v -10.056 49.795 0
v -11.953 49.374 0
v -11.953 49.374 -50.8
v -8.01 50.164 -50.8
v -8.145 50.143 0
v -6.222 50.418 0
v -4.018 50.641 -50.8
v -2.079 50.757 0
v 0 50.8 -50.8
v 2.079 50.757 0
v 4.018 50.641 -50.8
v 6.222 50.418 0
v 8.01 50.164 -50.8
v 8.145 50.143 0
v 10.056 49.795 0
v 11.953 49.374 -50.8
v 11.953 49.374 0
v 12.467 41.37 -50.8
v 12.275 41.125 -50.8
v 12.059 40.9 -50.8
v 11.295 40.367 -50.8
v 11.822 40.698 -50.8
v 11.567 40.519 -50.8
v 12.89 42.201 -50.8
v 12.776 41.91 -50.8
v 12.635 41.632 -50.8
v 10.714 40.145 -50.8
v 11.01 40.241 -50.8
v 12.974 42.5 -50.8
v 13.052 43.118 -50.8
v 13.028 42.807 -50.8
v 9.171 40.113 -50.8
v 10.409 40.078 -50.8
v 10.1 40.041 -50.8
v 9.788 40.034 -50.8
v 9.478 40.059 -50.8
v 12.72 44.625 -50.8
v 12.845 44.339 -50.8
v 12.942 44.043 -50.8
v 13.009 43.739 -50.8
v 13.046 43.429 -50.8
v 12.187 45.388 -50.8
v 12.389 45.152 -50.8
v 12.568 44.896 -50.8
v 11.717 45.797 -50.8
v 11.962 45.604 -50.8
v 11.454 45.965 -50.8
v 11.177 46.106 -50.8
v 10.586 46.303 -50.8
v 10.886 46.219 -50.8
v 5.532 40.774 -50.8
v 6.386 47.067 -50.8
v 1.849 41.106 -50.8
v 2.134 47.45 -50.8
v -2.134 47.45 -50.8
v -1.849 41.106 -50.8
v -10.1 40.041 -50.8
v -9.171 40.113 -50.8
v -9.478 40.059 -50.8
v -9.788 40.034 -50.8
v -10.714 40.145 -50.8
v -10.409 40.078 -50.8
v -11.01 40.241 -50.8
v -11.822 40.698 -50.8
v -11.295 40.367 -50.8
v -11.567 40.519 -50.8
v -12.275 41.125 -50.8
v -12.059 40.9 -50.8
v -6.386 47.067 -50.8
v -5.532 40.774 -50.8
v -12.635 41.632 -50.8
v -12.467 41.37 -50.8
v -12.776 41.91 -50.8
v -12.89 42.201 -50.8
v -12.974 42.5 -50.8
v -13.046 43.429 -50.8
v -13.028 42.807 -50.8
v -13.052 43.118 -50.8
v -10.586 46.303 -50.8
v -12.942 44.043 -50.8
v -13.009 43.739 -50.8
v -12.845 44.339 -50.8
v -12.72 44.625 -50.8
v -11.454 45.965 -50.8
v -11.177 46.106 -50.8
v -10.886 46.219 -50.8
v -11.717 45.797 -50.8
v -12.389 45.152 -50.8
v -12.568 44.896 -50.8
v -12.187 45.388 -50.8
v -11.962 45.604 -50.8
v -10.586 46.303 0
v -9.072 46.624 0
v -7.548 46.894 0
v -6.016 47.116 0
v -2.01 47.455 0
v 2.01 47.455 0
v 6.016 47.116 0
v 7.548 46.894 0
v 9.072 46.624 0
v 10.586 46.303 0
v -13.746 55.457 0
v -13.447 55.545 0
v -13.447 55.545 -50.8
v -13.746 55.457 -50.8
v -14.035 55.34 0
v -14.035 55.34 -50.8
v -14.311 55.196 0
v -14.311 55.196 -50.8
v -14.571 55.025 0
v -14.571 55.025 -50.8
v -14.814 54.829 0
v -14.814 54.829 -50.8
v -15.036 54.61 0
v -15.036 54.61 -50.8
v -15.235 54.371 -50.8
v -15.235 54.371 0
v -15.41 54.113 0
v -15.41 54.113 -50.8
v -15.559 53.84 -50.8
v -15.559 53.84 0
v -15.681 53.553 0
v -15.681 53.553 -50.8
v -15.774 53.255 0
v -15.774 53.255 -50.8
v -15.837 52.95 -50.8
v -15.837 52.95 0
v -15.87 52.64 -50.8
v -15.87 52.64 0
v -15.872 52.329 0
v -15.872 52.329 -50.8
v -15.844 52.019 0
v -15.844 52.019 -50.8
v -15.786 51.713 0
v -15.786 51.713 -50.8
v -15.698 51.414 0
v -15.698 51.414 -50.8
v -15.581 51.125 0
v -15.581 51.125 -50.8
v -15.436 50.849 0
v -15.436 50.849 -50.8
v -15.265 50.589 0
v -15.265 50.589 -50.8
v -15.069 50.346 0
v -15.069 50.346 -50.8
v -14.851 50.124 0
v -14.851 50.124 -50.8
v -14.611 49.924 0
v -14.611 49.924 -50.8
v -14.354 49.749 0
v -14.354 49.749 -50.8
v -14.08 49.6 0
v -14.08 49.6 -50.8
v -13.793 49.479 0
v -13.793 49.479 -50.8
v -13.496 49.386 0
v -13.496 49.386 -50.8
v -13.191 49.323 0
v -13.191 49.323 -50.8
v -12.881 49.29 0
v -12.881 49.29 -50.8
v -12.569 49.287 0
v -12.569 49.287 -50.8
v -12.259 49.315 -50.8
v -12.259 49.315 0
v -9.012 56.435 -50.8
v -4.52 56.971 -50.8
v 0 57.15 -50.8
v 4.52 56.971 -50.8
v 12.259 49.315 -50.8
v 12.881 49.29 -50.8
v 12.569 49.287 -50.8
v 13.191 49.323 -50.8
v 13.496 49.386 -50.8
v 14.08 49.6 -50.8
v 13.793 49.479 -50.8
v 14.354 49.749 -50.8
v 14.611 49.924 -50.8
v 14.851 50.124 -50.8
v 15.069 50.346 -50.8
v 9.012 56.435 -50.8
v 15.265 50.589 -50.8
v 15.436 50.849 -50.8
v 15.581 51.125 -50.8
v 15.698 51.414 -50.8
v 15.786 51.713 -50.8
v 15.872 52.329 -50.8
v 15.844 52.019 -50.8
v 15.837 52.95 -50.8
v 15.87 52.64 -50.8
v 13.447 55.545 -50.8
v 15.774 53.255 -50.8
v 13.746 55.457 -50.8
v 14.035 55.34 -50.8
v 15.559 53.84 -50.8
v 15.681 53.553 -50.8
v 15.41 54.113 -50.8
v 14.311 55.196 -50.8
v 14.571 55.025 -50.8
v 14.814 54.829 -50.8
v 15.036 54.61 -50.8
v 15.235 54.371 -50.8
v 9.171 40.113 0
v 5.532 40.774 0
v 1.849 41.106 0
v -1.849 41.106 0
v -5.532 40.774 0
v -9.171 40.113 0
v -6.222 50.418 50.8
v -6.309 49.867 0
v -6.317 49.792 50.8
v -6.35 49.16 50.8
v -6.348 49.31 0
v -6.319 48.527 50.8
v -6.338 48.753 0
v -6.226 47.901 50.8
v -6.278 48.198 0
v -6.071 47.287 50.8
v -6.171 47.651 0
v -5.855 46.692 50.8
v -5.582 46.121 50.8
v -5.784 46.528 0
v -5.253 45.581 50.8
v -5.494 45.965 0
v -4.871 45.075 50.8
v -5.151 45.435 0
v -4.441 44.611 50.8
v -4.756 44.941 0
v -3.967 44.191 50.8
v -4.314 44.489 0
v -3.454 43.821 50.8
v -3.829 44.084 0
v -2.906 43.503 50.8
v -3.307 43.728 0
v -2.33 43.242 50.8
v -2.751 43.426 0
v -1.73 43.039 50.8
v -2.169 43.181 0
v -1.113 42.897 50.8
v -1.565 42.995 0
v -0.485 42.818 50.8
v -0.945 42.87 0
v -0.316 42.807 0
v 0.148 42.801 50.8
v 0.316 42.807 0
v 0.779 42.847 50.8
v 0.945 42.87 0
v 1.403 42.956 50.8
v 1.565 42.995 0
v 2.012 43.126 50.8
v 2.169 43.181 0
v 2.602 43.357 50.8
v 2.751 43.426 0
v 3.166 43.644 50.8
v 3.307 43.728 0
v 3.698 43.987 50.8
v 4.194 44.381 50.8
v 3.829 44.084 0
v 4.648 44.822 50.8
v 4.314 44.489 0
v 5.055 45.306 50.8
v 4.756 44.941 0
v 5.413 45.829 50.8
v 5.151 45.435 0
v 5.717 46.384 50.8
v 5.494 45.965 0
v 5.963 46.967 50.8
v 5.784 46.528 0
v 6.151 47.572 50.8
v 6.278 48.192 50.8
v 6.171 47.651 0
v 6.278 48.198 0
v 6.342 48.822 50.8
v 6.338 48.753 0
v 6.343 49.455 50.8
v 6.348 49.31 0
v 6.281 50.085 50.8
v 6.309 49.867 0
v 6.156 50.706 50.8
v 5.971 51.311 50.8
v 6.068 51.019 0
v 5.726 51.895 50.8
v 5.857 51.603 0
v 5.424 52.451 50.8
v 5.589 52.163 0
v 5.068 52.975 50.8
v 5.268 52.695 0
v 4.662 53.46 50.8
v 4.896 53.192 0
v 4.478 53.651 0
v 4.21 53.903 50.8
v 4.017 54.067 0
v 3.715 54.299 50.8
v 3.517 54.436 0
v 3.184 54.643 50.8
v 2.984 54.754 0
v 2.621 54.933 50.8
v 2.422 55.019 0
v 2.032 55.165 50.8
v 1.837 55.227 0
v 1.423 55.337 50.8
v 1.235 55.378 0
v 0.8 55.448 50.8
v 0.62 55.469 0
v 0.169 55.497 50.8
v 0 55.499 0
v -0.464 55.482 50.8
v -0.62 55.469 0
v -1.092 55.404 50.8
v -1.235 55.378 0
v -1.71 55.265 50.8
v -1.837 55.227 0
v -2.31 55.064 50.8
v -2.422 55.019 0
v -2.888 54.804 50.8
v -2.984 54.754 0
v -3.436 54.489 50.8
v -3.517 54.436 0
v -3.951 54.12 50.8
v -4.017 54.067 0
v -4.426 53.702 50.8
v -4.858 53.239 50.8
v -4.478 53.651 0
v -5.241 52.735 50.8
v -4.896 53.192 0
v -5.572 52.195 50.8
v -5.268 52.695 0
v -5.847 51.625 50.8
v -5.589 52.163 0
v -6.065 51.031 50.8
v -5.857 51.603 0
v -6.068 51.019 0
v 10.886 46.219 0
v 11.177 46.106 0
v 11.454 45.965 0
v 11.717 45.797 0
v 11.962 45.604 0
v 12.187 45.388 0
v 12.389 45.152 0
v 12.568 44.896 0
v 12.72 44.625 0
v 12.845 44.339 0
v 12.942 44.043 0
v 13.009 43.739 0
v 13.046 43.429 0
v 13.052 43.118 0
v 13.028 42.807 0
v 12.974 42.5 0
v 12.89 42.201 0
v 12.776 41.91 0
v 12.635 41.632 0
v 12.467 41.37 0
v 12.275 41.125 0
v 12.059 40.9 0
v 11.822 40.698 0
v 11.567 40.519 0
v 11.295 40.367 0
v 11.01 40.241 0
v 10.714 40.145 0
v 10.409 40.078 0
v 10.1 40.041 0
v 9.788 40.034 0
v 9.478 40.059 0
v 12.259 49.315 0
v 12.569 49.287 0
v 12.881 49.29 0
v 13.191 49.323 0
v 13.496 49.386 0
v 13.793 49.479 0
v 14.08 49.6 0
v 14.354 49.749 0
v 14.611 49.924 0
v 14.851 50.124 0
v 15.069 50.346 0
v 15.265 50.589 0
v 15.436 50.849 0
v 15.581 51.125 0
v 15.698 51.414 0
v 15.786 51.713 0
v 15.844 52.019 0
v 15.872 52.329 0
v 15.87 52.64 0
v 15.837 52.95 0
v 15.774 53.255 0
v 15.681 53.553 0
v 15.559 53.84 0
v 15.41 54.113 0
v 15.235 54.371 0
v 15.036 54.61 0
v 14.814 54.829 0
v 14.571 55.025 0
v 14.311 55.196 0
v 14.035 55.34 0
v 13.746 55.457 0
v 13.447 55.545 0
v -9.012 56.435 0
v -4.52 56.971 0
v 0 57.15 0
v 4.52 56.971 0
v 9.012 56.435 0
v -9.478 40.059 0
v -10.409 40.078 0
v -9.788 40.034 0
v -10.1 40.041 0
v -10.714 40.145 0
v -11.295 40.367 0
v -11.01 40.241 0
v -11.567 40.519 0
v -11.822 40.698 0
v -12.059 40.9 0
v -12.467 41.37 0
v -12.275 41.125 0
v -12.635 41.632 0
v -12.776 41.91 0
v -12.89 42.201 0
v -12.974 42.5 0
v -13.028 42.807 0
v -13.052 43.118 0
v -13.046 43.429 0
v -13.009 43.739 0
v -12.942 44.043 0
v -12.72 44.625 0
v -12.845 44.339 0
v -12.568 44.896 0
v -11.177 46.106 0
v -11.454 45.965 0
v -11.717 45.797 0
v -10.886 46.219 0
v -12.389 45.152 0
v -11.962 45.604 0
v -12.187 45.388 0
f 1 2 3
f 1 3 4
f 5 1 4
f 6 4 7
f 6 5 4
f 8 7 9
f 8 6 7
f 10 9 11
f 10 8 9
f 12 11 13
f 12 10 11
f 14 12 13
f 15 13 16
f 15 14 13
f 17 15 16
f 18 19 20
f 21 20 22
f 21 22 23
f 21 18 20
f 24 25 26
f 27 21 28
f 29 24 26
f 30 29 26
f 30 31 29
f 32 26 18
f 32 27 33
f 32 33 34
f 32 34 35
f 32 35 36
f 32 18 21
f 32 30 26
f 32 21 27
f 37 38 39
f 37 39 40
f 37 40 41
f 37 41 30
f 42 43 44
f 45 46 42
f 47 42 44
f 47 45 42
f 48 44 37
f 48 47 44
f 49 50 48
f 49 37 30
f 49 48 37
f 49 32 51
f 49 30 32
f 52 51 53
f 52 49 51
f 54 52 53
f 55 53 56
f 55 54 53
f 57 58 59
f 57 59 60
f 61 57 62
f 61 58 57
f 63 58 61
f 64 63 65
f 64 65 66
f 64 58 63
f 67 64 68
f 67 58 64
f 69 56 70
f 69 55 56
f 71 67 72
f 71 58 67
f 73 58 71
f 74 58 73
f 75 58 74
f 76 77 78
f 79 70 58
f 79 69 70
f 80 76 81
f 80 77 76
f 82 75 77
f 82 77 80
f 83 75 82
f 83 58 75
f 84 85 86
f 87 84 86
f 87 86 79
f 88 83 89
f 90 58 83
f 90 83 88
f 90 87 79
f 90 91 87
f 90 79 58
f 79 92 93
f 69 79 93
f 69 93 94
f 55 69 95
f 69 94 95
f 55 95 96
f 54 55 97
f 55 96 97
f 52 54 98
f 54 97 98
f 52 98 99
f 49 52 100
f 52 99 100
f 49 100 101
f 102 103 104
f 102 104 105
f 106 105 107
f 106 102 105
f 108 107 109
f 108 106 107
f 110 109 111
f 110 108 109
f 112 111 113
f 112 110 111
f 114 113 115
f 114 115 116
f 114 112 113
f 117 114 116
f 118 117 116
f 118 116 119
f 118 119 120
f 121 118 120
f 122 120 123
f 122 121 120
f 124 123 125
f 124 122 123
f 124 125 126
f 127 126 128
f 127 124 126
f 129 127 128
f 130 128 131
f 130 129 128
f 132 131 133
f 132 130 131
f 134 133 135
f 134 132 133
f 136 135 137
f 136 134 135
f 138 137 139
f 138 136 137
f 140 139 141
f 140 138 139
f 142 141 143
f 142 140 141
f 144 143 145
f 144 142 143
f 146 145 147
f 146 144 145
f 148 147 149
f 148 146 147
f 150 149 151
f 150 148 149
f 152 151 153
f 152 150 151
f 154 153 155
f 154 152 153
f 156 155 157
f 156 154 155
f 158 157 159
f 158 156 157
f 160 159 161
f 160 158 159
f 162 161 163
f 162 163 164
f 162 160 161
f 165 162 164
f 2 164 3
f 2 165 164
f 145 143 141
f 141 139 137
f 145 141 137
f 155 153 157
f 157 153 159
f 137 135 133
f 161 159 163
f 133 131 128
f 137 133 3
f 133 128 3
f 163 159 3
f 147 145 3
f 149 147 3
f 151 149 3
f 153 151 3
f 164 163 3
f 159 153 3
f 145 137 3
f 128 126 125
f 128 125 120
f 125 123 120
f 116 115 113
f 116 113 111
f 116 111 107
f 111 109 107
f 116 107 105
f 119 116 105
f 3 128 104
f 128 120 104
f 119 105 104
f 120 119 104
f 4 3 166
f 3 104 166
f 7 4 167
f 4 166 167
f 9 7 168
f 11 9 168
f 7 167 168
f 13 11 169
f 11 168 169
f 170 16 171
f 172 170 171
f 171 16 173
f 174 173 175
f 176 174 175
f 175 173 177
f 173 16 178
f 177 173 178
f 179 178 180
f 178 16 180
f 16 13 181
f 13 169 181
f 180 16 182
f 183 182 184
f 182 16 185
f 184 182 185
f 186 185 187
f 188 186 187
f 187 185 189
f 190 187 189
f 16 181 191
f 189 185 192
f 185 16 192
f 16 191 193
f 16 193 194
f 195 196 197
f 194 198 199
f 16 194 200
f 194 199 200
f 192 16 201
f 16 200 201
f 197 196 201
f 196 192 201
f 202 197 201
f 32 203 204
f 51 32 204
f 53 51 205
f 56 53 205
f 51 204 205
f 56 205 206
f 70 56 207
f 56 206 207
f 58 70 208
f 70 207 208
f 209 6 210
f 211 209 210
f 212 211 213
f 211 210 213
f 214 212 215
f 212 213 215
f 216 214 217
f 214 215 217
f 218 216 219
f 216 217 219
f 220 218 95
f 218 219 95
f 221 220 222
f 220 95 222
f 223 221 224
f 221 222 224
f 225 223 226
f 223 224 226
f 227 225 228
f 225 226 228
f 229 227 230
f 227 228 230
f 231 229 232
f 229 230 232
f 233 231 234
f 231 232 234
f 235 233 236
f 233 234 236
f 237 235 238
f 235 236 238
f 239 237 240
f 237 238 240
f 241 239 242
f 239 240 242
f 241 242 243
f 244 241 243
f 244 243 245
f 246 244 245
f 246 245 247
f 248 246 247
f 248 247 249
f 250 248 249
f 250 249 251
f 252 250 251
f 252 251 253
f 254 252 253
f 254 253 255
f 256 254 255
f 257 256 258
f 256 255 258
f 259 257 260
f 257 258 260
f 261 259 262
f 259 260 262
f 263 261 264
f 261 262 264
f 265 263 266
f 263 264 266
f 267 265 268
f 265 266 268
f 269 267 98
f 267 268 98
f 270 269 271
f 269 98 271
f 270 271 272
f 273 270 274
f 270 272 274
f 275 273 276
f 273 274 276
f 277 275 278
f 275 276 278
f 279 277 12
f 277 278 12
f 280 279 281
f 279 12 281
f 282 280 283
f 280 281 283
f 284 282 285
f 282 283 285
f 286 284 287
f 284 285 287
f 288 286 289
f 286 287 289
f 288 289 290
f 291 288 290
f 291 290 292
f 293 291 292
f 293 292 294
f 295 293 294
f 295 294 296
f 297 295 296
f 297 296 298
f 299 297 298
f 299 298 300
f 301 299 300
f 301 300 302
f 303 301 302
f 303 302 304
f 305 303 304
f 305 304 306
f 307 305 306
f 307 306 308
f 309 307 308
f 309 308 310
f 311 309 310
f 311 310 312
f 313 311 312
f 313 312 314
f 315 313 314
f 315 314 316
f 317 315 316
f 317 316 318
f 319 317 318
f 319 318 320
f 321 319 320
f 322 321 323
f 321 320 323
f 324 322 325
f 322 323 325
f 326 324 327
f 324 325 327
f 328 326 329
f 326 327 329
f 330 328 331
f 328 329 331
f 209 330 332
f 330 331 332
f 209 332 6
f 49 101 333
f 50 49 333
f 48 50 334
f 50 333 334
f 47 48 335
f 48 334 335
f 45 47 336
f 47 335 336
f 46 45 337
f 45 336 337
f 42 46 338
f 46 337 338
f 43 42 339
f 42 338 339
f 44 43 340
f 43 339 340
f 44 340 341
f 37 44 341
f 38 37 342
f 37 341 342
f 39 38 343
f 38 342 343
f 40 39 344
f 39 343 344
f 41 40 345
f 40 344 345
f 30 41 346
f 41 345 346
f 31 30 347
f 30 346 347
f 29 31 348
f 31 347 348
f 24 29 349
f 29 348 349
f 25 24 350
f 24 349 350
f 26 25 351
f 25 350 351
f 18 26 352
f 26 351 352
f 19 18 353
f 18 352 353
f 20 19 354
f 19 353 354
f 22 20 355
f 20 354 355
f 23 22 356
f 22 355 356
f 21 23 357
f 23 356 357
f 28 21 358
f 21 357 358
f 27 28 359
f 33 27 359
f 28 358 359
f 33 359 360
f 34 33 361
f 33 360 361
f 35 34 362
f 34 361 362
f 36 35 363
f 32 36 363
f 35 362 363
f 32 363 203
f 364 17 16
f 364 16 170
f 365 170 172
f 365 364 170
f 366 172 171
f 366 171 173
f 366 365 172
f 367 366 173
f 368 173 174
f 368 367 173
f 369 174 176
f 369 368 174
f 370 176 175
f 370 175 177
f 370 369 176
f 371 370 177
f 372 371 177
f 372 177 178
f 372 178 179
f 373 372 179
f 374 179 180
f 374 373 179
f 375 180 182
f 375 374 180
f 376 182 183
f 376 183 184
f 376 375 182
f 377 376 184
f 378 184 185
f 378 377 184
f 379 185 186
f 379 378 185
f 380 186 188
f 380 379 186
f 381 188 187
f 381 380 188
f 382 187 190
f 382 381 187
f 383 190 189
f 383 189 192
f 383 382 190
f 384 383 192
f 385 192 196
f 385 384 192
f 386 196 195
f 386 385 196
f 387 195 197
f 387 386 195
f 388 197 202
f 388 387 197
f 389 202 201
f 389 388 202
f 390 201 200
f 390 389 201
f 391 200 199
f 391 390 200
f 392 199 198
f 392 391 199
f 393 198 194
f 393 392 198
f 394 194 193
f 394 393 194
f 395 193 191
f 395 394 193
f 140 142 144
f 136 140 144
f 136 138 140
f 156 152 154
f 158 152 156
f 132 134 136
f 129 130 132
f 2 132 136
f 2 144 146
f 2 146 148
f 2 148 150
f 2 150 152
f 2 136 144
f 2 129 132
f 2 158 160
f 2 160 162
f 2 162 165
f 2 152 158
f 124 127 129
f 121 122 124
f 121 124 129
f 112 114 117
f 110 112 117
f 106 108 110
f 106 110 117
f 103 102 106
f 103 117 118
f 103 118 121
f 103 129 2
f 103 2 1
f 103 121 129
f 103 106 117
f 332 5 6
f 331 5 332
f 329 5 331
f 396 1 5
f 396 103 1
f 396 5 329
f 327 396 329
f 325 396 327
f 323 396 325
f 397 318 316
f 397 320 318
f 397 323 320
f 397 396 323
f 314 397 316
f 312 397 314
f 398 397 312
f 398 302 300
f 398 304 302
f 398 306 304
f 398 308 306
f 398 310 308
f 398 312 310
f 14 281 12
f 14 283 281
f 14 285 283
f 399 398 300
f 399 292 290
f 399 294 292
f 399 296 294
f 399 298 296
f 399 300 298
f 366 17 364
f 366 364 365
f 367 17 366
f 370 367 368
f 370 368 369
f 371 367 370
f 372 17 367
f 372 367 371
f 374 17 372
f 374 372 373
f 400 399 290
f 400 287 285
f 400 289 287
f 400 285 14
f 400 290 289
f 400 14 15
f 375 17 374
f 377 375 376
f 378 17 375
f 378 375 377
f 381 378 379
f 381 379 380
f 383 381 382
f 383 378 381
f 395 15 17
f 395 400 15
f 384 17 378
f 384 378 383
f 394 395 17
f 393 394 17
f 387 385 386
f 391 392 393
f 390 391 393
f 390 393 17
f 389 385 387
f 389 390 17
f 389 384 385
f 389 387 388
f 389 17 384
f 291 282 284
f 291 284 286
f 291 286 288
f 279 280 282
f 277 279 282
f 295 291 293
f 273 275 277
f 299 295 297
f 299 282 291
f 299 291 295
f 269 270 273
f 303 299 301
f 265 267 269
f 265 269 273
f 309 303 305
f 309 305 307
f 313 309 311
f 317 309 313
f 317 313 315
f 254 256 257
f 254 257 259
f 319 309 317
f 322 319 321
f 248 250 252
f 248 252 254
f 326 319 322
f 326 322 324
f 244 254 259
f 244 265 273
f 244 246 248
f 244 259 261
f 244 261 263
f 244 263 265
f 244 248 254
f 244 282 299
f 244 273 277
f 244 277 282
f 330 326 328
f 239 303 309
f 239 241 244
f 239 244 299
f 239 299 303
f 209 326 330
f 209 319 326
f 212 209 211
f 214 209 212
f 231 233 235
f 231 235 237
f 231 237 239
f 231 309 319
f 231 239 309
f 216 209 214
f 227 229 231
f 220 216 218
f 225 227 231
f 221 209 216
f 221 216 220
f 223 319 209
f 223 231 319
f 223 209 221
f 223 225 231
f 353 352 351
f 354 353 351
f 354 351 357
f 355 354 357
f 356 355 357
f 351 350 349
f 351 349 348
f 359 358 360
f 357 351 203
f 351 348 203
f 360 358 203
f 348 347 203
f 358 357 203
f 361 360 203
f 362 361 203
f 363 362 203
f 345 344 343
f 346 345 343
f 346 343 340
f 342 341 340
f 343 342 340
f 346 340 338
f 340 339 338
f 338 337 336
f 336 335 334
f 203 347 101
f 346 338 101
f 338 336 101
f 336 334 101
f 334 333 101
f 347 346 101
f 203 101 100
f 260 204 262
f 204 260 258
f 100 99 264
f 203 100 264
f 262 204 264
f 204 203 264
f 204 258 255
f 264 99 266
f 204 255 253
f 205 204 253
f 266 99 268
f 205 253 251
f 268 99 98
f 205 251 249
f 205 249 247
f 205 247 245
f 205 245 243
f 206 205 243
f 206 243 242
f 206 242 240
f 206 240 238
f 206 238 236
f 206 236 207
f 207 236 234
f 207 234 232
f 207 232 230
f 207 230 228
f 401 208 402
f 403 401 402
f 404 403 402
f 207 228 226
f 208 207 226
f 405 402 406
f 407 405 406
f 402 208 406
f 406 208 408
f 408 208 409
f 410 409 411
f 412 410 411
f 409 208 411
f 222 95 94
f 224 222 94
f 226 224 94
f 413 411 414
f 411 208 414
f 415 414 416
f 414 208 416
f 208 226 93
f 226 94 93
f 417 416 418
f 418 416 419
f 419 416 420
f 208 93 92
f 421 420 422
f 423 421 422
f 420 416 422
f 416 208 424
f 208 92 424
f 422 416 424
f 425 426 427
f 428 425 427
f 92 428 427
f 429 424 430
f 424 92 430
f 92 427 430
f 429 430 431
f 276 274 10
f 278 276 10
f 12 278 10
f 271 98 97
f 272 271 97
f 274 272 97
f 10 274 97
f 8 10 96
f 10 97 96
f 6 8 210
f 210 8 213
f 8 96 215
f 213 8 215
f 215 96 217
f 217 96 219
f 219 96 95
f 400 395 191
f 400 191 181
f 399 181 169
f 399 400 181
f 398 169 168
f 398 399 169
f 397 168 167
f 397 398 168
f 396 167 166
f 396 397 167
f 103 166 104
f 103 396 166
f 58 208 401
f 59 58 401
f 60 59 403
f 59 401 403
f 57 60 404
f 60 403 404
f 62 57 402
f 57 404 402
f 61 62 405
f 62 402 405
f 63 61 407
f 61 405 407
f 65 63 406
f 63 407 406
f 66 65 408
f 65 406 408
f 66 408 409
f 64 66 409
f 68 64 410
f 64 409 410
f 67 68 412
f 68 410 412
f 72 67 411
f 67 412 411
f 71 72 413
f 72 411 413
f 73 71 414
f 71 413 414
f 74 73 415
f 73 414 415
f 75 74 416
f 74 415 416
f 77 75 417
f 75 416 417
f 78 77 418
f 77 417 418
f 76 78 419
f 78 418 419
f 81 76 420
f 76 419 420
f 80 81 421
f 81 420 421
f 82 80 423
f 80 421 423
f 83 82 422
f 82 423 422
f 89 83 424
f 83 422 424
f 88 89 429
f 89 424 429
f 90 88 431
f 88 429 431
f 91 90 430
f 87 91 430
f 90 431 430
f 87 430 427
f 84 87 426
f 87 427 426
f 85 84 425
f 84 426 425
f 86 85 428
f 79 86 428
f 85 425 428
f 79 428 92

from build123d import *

# Parameters (mm, degrees)
BOSS_EXTRUDE1_DEPTH   = 50.8
BOSS_EXTRUDE1_2_DEPTH = 50.8
SKETCH2_R             = 6.35
BOSS_EXTRUDE2_DEPTH   = 50.8


with BuildPart() as part:
    # Sketch1 → Boss-Extrude1 (new body)
    with BuildSketch(Plane.XY):
        with BuildLine():
            ThreePointArc((-11.952941176, 49.373750083), (0, 50.8), (11.952941176, 49.373750083))
            ThreePointArc((11.952941176, 49.373750083), (15.78585938, 51.712550639), (13.447058824, 55.545468843))
            ThreePointArc((13.447058824, 55.545468843), (0, 57.15), (-13.447058824, 55.545468843))
            ThreePointArc((-13.447058824, 55.545468843), (-15.78585938, 51.712550639), (-11.952941176, 49.373750083))
        make_face()
    extrude(amount=-BOSS_EXTRUDE1_DEPTH)



with BuildPart() as body_2:
    # Sketch1 → Boss-Extrude1 2 (new body)
    with BuildSketch(Plane.XY):
        with BuildLine():
            ThreePointArc((-10.586266882, 46.303249967), (0, 47.498), (10.586266882, 46.303249967))
            ThreePointArc((10.586266882, 46.303249967), (12.973765752, 42.500474776), (9.170990561, 40.112975907))
            ThreePointArc((9.170990561, 40.112975907), (0, 41.148), (-9.170990561, 40.112975907))
            ThreePointArc((-9.170990561, 40.112975907), (-12.973765752, 42.500474776), (-10.586266882, 46.303249967))
        make_face()
    extrude(amount=-BOSS_EXTRUDE1_2_DEPTH)


with BuildPart() as part_1:
    add(part.part)

    add(body_2.part)  # Boss-Extrude2 merges body 2
    # Sketch2 → Boss-Extrude2 (add)
    with BuildSketch(Plane.XY):
        with Locations(Location((0, 49.149, 0), (0, 0, 168.476640001))):
            Circle(SKETCH2_R)
    extrude(amount=BOSS_EXTRUDE2_DEPTH)


solid = part_1.part
